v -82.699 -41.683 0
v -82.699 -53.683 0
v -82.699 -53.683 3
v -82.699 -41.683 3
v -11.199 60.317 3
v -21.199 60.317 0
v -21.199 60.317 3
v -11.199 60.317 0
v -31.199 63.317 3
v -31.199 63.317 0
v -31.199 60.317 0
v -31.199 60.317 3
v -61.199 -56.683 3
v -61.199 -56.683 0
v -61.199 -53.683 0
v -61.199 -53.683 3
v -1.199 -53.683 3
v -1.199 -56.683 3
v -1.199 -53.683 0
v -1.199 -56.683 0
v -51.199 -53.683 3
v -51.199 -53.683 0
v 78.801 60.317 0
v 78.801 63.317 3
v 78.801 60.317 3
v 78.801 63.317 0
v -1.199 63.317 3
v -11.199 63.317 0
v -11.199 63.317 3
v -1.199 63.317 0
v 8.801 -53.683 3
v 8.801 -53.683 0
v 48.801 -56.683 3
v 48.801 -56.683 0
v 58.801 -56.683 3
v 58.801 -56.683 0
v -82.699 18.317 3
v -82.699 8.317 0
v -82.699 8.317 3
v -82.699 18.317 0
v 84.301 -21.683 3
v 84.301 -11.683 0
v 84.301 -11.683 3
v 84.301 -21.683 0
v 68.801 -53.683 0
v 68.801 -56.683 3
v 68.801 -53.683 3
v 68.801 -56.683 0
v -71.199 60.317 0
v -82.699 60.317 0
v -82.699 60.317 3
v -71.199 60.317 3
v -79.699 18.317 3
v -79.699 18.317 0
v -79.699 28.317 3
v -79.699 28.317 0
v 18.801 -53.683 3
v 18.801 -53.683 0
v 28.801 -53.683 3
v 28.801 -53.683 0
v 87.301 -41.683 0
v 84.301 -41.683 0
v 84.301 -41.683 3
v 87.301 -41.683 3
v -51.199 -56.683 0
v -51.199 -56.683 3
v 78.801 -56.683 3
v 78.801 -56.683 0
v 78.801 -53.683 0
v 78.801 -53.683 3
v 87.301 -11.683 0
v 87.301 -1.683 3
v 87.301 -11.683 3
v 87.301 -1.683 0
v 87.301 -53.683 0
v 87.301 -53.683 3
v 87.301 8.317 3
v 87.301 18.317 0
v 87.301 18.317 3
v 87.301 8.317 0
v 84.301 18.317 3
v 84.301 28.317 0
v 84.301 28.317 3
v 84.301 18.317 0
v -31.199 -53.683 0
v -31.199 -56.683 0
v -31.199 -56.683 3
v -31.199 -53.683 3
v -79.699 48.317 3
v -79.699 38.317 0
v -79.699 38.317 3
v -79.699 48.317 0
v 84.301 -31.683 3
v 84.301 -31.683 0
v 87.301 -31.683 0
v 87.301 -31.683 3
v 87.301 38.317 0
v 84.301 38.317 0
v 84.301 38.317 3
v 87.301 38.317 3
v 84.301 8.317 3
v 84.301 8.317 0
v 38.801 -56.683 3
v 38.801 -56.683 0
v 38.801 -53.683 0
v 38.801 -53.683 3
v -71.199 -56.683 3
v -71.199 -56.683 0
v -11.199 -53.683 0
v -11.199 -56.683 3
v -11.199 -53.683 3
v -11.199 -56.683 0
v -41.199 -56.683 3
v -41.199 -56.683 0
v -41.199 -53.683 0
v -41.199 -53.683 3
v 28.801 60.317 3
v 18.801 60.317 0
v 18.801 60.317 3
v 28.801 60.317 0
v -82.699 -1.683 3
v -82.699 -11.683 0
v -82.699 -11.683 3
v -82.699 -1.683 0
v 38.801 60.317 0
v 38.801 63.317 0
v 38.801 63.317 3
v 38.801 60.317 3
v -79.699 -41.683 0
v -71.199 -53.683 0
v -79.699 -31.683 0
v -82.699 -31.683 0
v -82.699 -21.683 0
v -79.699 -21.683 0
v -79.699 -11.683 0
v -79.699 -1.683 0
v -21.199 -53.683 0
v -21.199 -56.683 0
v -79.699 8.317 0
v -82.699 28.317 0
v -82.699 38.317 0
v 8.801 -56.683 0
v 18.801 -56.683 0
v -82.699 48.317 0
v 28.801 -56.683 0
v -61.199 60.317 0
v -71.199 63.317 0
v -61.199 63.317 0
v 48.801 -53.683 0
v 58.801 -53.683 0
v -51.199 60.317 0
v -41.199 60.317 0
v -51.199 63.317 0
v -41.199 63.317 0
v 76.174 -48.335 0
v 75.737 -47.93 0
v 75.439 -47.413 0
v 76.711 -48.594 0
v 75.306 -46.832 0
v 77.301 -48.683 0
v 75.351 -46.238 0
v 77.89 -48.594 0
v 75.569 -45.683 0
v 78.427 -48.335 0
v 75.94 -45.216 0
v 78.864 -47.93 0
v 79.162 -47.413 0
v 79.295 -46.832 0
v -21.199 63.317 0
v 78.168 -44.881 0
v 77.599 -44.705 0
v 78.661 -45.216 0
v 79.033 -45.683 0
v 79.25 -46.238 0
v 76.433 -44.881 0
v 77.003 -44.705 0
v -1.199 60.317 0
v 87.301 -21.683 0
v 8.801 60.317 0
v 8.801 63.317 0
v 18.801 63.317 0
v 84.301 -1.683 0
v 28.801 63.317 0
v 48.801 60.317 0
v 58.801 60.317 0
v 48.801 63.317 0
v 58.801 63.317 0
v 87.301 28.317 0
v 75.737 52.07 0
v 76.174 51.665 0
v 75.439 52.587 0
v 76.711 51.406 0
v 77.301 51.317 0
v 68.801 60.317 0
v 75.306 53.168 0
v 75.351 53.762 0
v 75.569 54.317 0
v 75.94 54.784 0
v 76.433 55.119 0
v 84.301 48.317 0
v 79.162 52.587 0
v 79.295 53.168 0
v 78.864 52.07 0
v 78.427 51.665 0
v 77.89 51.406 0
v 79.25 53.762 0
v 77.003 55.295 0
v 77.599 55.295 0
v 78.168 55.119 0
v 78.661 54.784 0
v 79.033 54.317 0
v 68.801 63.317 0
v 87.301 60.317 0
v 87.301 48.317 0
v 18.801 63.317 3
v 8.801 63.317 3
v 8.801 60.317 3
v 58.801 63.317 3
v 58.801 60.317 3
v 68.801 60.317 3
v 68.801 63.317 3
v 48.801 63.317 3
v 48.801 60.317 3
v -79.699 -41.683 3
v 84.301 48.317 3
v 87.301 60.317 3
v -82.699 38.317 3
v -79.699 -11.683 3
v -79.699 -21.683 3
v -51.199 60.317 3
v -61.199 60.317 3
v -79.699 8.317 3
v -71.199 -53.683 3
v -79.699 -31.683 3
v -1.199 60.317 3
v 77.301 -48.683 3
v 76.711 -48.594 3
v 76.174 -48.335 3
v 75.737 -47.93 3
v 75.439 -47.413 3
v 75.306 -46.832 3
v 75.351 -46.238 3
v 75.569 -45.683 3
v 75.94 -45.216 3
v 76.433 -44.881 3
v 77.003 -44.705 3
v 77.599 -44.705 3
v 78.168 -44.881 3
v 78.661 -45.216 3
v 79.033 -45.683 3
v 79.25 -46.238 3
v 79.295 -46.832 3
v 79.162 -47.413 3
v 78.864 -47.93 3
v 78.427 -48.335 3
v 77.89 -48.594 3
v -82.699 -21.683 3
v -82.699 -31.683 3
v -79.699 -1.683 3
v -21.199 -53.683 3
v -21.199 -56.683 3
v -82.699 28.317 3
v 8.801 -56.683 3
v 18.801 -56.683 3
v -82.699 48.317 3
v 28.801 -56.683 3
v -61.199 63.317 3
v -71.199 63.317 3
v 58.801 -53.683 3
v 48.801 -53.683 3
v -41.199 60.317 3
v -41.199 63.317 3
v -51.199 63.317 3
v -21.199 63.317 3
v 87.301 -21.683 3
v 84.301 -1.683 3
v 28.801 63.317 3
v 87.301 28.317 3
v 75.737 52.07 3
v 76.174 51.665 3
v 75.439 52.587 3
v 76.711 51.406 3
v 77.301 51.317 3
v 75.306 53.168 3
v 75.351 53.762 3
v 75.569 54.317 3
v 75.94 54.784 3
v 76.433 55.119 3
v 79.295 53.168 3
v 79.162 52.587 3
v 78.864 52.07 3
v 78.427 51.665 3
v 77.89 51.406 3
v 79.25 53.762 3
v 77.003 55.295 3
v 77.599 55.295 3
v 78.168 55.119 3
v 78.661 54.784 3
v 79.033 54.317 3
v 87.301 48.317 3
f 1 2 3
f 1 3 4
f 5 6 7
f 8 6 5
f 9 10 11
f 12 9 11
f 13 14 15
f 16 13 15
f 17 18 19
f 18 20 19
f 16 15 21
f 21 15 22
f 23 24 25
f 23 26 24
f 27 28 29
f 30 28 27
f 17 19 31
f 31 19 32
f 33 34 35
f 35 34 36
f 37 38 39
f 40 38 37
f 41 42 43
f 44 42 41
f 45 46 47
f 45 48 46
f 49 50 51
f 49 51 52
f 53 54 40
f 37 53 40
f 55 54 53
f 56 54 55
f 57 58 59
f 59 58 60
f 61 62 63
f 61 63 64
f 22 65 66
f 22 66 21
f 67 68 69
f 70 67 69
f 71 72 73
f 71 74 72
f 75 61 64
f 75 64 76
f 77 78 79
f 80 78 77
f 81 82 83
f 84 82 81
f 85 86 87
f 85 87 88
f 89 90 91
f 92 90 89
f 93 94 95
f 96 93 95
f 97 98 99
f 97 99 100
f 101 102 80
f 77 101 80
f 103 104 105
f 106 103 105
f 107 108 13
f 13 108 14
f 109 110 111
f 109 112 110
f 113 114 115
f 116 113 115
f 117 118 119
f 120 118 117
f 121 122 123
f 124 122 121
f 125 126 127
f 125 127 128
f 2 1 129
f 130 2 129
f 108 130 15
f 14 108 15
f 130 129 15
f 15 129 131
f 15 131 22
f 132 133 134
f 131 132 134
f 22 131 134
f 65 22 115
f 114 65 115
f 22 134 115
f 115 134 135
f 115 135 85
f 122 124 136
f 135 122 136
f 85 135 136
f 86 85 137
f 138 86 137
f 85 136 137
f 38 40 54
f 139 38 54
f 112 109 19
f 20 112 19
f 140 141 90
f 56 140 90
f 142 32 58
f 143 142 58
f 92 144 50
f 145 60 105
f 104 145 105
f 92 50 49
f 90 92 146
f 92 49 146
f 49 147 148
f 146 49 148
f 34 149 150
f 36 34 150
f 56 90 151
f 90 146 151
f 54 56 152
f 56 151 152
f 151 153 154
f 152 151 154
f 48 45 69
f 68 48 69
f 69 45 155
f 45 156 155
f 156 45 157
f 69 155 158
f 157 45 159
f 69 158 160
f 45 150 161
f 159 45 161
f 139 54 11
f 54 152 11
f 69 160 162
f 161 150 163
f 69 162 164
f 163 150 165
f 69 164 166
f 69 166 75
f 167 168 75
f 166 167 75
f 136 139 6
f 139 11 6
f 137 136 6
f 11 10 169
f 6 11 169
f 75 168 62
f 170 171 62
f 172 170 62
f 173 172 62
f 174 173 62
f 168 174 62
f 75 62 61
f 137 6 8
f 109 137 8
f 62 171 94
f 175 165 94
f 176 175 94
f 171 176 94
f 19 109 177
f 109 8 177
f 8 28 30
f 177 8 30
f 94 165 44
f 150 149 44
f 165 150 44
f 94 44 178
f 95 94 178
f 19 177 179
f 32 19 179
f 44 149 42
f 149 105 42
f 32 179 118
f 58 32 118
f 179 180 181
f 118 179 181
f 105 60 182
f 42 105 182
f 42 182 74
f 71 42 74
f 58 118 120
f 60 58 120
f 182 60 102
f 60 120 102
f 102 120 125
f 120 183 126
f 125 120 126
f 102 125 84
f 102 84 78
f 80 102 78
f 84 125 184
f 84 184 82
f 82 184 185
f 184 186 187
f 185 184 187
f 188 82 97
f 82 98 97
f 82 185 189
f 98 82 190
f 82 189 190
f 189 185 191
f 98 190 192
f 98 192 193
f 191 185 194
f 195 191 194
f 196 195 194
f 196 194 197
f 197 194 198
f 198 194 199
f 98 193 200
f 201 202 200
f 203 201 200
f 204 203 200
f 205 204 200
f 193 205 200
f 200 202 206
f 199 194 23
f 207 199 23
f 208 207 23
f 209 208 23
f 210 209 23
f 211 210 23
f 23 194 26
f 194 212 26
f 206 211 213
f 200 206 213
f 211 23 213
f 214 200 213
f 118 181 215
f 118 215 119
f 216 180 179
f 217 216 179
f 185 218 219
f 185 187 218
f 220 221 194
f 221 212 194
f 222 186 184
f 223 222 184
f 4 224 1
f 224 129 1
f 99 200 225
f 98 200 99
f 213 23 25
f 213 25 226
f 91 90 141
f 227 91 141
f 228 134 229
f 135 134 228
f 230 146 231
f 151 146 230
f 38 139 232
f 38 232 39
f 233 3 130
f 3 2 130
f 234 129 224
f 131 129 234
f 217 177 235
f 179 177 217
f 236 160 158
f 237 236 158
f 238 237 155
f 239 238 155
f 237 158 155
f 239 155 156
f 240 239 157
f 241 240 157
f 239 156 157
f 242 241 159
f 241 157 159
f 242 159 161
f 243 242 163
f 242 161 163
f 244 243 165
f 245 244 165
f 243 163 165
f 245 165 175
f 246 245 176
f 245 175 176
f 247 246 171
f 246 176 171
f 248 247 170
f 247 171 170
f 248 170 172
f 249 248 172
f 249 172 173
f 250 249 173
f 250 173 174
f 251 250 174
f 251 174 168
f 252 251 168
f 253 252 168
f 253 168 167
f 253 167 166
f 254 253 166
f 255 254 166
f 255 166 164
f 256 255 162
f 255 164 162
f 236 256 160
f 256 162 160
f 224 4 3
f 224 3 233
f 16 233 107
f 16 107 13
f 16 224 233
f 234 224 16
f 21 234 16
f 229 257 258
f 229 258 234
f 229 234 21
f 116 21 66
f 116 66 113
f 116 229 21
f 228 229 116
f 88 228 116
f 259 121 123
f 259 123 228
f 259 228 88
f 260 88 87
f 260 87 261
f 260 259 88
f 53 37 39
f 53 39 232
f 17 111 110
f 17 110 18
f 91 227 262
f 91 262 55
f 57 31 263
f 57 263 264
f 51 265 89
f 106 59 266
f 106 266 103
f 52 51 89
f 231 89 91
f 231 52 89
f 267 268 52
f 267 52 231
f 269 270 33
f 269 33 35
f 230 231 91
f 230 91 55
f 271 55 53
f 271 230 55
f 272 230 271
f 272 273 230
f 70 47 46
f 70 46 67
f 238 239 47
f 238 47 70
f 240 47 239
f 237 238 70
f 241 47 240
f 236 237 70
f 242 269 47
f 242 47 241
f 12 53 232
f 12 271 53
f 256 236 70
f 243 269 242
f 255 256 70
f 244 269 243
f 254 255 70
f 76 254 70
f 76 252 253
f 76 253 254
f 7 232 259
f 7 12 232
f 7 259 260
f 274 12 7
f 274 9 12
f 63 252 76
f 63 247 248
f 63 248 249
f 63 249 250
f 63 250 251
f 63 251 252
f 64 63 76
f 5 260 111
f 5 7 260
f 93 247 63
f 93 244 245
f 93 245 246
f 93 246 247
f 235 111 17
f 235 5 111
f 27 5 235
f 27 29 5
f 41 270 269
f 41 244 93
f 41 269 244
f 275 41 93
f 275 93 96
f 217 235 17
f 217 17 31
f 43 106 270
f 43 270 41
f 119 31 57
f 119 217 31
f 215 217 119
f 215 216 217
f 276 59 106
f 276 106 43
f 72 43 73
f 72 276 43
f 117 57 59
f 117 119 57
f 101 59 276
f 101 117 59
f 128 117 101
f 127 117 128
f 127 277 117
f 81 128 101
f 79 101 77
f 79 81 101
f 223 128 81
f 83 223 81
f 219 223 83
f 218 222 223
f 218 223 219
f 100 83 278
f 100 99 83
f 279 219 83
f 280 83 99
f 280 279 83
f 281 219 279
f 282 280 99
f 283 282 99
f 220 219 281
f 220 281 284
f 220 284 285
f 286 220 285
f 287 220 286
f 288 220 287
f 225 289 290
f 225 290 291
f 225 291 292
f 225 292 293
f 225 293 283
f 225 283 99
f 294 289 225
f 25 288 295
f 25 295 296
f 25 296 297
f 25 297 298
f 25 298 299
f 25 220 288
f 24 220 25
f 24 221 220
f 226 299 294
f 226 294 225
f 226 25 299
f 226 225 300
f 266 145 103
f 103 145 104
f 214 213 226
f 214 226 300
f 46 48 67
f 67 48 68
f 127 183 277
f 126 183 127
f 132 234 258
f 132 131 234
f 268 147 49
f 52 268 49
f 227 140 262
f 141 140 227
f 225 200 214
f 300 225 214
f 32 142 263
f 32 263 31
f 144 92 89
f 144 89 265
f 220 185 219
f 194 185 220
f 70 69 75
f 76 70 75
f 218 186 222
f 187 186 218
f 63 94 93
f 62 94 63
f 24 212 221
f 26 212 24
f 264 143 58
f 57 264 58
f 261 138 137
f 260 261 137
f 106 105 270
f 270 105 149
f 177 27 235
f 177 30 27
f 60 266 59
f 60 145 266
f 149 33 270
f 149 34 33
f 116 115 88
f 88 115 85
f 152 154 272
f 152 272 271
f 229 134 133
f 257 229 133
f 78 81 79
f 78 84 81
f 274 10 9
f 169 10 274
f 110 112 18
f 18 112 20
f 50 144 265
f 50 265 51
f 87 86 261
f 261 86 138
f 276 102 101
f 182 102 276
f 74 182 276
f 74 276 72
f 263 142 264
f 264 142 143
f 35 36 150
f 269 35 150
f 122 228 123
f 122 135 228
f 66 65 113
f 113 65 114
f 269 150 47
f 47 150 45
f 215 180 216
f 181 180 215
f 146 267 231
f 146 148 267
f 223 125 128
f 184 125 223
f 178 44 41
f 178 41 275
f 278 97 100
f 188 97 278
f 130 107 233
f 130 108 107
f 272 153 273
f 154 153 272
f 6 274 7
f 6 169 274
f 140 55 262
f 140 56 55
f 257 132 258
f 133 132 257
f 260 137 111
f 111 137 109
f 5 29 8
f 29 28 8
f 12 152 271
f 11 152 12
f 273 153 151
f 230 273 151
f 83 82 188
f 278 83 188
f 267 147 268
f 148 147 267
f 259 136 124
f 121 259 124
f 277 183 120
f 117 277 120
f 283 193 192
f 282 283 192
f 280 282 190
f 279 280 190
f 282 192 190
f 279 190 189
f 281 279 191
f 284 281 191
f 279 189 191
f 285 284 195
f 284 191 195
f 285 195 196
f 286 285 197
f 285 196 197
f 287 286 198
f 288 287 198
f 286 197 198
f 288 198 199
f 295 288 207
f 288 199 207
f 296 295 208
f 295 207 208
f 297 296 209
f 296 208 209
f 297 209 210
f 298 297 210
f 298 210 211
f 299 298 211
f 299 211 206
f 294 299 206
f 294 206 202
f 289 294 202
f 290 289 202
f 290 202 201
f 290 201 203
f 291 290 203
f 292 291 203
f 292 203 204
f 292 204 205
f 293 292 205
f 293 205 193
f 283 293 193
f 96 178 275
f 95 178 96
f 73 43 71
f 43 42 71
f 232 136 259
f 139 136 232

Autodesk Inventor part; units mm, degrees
ref_plane "YZ Plane" through (0, 0, 0) normal (1, 0, 0) x (0, 1, 0)
ref_plane "XZ Plane" through (0, 0, 0) normal (0, 1, 0) x (-1, 0, 0)
ref_plane "XY Plane" through (0, 0, 0) normal (0, 0, 1) x (1, 0, 0)
sketch "Esquisse1" plane through (0, 0, 0) normal (0, 0, 1) x (1, 0, 0)
  line L0 (87.3006, 60.3174) -> (87.3006, 48.3174)
  line L1 (87.3006, 38.3174) -> (87.3006, 28.3174)
  line L2 (84.3006, 48.3174) -> (84.3006, 38.3174)
  line L3 (84.3006, 48.3174) -> (87.3006, 48.3174)
  line L4 (84.3006, 38.3174) -> (87.3006, 38.3174)
  line L5 (84.3006, 28.3174) -> (84.3006, 18.3174)
  line L6 (84.3006, 28.3174) -> (87.3006, 28.3174)
  line L7 (78.8006, 60.3174) -> (87.3006, 60.3174)
  line L8 (68.8006, 63.3174) -> (78.8006, 63.3174)
  line L9 (78.8006, 63.3174) -> (78.8006, 60.3174)
  line L10 (58.8006, 60.3174) -> (68.8006, 60.3174)
  line L11 (68.8006, 63.3174) -> (68.8006, 60.3174)
  line L12 (48.8006, 63.3174) -> (58.8006, 63.3174)
  line L13 (58.8006, 63.3174) -> (58.8006, 60.3174)
  line L14 (48.8006, 63.3174) -> (48.8006, 60.3174)
  line L15 (38.8006, 63.3174) -> (38.8006, 60.3174)
  line L16 (18.8006, 60.3174) -> (28.8006, 60.3174)
  line L17 (28.8006, 63.3174) -> (38.8006, 63.3174)
  line L18 (28.8006, 63.3174) -> (28.8006, 60.3174)
  line L19 (38.8006, 60.3174) -> (48.8006, 60.3174)
  line L20 (87.3006, 18.3174) -> (87.3006, 8.3174)
  line L21 (87.3006, -21.6826) -> (87.3006, -31.6826)
  line L22 (87.3006, -1.6826) -> (87.3006, -11.6826)
  line L23 (87.3006, -41.6826) -> (87.3006, -53.6826)
  line L24 (84.3006, -31.6826) -> (84.3006, -41.6826)
  line L25 (84.3006, -31.6826) -> (87.3006, -31.6826)
  line L26 (48.8006, -56.6826) -> (58.8006, -56.6826)
  line L27 (58.8006, -56.6826) -> (58.8006, -53.6826)
  line L28 (58.8006, -53.6826) -> (68.8006, -53.6826)
  line L29 (68.8006, -56.6826) -> (68.8006, -53.6826)
  line L30 (68.8006, -56.6826) -> (78.8006, -56.6826)
  line L31 (78.8006, -56.6826) -> (78.8006, -53.6826)
  line L32 (78.8006, -53.6826) -> (87.3006, -53.6826)
  line L33 (84.3006, -41.6826) -> (87.3006, -41.6826)
  line L34 (84.3006, -21.6826) -> (87.3006, -21.6826)
  line L35 (84.3006, -11.6826) -> (84.3006, -21.6826)
  line L36 (84.3006, -11.6826) -> (87.3006, -11.6826)
  line L37 (84.3006, 8.3174) -> (84.3006, -1.6826)
  line L38 (84.3006, 8.3174) -> (87.3006, 8.3174)
  line L39 (84.3006, 18.3174) -> (87.3006, 18.3174)
  line L40 (84.3006, -1.6826) -> (87.3006, -1.6826)
  line L41 (-1.1994, 60.3174) -> (8.8006, 60.3174)
  line L42 (-21.1994, 60.3174) -> (-11.1994, 60.3174)
  line L43 (-11.1994, 63.3174) -> (-11.1994, 60.3174)
  line L44 (-11.1994, 63.3174) -> (-1.1994, 63.3174)
  line L45 (-1.1994, 63.3174) -> (-1.1994, 60.3174)
  line L46 (8.8006, 63.3174) -> (8.8006, 60.3174)
  line L47 (18.8006, 63.3174) -> (18.8006, 60.3174)
  line L48 (8.8006, 63.3174) -> (18.8006, 63.3174)
  line L49 (38.8006, -56.6826) -> (38.8006, -53.6826)
  line L50 (38.8006, -53.6826) -> (48.8006, -53.6826)
  line L51 (28.8006, -56.6826) -> (28.8006, -53.6826)
  line L52 (28.8006, -56.6826) -> (38.8006, -56.6826)
  line L53 (18.8006, -53.6826) -> (28.8006, -53.6826)
  line L54 (18.8006, -56.6826) -> (18.8006, -53.6826)
  line L55 (8.8006, -56.6826) -> (8.8006, -53.6826)
  line L56 (8.8006, -56.6826) -> (18.8006, -56.6826)
  line L57 (-1.1994, -53.6826) -> (8.8006, -53.6826)
  line L58 (-1.1994, -56.6826) -> (-1.1994, -53.6826)
  line L59 (-11.1994, -56.6826) -> (-11.1994, -53.6826)
  line L60 (-11.1994, -56.6826) -> (-1.1994, -56.6826)
  line L61 (-21.1994, -53.6826) -> (-11.1994, -53.6826)
  line L62 (-21.1994, -56.6826) -> (-21.1994, -53.6826)
  line L63 (-31.1994, -56.6826) -> (-31.1994, -53.6826)
  line L64 (-31.1994, -56.6826) -> (-21.1994, -56.6826)
  line L65 (-41.1994, -53.6826) -> (-31.1994, -53.6826)
  line L66 (48.8006, -56.6826) -> (48.8006, -53.6826)
  line L67 (-82.6994, 28.3174) -> (-82.6994, 38.3174)
  line L68 (-82.6994, 48.3174) -> (-82.6994, 60.3174)
  line L69 (-79.6994, 38.3174) -> (-79.6994, 48.3174)
  line L70 (-79.6994, 48.3174) -> (-82.6994, 48.3174)
  line L71 (-79.6994, 38.3174) -> (-82.6994, 38.3174)
  line L72 (-79.6994, 18.3174) -> (-79.6994, 28.3174)
  line L73 (-79.6994, 28.3174) -> (-82.6994, 28.3174)
  line L74 (-41.1994, 60.3174) -> (-31.1994, 60.3174)
  line L75 (-21.1994, 63.3174) -> (-21.1994, 60.3174)
  line L76 (-31.1994, 63.3174) -> (-31.1994, 60.3174)
  line L77 (-41.1994, 63.3174) -> (-41.1994, 60.3174)
  line L78 (-51.1994, 63.3174) -> (-41.1994, 63.3174)
  line L79 (-51.1994, 63.3174) -> (-51.1994, 60.3174)
  line L80 (-61.1994, 60.3174) -> (-51.1994, 60.3174)
  line L81 (-61.1994, 63.3174) -> (-61.1994, 60.3174)
  line L82 (-71.1994, 63.3174) -> (-61.1994, 63.3174)
  line L83 (-71.1994, 63.3174) -> (-71.1994, 60.3174)
  line L84 (-82.6994, 60.3174) -> (-71.1994, 60.3174)
  line L85 (-31.1994, 63.3174) -> (-21.1994, 63.3174)
  line L86 (-82.6994, 8.3174) -> (-82.6994, 18.3174)
  line L87 (-82.6994, -53.6826) -> (-82.6994, -41.6826)
  line L88 (-82.6994, -31.6826) -> (-82.6994, -21.6826)
  line L89 (-82.6994, -11.6826) -> (-82.6994, -1.6826)
  line L90 (-79.6994, 18.3174) -> (-82.6994, 18.3174)
  line L91 (-79.6994, -41.6826) -> (-79.6994, -31.6826)
  line L92 (-79.6994, -31.6826) -> (-82.6994, -31.6826)
  line L93 (-79.6994, -41.6826) -> (-82.6994, -41.6826)
  line L94 (-79.6994, -21.6826) -> (-79.6994, -11.6826)
  line L95 (-79.6994, -11.6826) -> (-82.6994, -11.6826)
  line L96 (-79.6994, -1.6826) -> (-79.6994, 8.3174)
  line L97 (-79.6994, -21.6826) -> (-82.6994, -21.6826)
  line L98 (-79.6994, 8.3174) -> (-82.6994, 8.3174)
  line L99 (-79.6994, -1.6826) -> (-82.6994, -1.6826)
  line L100 (-41.1994, -56.6826) -> (-41.1994, -53.6826)
  line L101 (-51.1994, -56.6826) -> (-41.1994, -56.6826)
  line L102 (-51.1994, -56.6826) -> (-51.1994, -53.6826)
  line L103 (-61.1994, -53.6826) -> (-51.1994, -53.6826)
  line L104 (-71.1994, -56.6826) -> (-61.1994, -56.6826)
  line L105 (-71.1994, -56.6826) -> (-71.1994, -53.6826)
  line L106 (-82.6994, -53.6826) -> (-71.1994, -53.6826)
  line L107 (-61.1994, -56.6826) -> (-61.1994, -53.6826)
  point P0 (0, 0)
extrude "Extrusion1" add sketch "Esquisse1" along normal blind 3
hole "Perçage1" at (77.3006, 53.3174, 3) direction (0, 0, -1) diameter 4 end through all
hole "Perçage2" at (77.3006, -46.6826, 3) direction (0, 0, -1) diameter 4 end through all
properties part number "fond"
